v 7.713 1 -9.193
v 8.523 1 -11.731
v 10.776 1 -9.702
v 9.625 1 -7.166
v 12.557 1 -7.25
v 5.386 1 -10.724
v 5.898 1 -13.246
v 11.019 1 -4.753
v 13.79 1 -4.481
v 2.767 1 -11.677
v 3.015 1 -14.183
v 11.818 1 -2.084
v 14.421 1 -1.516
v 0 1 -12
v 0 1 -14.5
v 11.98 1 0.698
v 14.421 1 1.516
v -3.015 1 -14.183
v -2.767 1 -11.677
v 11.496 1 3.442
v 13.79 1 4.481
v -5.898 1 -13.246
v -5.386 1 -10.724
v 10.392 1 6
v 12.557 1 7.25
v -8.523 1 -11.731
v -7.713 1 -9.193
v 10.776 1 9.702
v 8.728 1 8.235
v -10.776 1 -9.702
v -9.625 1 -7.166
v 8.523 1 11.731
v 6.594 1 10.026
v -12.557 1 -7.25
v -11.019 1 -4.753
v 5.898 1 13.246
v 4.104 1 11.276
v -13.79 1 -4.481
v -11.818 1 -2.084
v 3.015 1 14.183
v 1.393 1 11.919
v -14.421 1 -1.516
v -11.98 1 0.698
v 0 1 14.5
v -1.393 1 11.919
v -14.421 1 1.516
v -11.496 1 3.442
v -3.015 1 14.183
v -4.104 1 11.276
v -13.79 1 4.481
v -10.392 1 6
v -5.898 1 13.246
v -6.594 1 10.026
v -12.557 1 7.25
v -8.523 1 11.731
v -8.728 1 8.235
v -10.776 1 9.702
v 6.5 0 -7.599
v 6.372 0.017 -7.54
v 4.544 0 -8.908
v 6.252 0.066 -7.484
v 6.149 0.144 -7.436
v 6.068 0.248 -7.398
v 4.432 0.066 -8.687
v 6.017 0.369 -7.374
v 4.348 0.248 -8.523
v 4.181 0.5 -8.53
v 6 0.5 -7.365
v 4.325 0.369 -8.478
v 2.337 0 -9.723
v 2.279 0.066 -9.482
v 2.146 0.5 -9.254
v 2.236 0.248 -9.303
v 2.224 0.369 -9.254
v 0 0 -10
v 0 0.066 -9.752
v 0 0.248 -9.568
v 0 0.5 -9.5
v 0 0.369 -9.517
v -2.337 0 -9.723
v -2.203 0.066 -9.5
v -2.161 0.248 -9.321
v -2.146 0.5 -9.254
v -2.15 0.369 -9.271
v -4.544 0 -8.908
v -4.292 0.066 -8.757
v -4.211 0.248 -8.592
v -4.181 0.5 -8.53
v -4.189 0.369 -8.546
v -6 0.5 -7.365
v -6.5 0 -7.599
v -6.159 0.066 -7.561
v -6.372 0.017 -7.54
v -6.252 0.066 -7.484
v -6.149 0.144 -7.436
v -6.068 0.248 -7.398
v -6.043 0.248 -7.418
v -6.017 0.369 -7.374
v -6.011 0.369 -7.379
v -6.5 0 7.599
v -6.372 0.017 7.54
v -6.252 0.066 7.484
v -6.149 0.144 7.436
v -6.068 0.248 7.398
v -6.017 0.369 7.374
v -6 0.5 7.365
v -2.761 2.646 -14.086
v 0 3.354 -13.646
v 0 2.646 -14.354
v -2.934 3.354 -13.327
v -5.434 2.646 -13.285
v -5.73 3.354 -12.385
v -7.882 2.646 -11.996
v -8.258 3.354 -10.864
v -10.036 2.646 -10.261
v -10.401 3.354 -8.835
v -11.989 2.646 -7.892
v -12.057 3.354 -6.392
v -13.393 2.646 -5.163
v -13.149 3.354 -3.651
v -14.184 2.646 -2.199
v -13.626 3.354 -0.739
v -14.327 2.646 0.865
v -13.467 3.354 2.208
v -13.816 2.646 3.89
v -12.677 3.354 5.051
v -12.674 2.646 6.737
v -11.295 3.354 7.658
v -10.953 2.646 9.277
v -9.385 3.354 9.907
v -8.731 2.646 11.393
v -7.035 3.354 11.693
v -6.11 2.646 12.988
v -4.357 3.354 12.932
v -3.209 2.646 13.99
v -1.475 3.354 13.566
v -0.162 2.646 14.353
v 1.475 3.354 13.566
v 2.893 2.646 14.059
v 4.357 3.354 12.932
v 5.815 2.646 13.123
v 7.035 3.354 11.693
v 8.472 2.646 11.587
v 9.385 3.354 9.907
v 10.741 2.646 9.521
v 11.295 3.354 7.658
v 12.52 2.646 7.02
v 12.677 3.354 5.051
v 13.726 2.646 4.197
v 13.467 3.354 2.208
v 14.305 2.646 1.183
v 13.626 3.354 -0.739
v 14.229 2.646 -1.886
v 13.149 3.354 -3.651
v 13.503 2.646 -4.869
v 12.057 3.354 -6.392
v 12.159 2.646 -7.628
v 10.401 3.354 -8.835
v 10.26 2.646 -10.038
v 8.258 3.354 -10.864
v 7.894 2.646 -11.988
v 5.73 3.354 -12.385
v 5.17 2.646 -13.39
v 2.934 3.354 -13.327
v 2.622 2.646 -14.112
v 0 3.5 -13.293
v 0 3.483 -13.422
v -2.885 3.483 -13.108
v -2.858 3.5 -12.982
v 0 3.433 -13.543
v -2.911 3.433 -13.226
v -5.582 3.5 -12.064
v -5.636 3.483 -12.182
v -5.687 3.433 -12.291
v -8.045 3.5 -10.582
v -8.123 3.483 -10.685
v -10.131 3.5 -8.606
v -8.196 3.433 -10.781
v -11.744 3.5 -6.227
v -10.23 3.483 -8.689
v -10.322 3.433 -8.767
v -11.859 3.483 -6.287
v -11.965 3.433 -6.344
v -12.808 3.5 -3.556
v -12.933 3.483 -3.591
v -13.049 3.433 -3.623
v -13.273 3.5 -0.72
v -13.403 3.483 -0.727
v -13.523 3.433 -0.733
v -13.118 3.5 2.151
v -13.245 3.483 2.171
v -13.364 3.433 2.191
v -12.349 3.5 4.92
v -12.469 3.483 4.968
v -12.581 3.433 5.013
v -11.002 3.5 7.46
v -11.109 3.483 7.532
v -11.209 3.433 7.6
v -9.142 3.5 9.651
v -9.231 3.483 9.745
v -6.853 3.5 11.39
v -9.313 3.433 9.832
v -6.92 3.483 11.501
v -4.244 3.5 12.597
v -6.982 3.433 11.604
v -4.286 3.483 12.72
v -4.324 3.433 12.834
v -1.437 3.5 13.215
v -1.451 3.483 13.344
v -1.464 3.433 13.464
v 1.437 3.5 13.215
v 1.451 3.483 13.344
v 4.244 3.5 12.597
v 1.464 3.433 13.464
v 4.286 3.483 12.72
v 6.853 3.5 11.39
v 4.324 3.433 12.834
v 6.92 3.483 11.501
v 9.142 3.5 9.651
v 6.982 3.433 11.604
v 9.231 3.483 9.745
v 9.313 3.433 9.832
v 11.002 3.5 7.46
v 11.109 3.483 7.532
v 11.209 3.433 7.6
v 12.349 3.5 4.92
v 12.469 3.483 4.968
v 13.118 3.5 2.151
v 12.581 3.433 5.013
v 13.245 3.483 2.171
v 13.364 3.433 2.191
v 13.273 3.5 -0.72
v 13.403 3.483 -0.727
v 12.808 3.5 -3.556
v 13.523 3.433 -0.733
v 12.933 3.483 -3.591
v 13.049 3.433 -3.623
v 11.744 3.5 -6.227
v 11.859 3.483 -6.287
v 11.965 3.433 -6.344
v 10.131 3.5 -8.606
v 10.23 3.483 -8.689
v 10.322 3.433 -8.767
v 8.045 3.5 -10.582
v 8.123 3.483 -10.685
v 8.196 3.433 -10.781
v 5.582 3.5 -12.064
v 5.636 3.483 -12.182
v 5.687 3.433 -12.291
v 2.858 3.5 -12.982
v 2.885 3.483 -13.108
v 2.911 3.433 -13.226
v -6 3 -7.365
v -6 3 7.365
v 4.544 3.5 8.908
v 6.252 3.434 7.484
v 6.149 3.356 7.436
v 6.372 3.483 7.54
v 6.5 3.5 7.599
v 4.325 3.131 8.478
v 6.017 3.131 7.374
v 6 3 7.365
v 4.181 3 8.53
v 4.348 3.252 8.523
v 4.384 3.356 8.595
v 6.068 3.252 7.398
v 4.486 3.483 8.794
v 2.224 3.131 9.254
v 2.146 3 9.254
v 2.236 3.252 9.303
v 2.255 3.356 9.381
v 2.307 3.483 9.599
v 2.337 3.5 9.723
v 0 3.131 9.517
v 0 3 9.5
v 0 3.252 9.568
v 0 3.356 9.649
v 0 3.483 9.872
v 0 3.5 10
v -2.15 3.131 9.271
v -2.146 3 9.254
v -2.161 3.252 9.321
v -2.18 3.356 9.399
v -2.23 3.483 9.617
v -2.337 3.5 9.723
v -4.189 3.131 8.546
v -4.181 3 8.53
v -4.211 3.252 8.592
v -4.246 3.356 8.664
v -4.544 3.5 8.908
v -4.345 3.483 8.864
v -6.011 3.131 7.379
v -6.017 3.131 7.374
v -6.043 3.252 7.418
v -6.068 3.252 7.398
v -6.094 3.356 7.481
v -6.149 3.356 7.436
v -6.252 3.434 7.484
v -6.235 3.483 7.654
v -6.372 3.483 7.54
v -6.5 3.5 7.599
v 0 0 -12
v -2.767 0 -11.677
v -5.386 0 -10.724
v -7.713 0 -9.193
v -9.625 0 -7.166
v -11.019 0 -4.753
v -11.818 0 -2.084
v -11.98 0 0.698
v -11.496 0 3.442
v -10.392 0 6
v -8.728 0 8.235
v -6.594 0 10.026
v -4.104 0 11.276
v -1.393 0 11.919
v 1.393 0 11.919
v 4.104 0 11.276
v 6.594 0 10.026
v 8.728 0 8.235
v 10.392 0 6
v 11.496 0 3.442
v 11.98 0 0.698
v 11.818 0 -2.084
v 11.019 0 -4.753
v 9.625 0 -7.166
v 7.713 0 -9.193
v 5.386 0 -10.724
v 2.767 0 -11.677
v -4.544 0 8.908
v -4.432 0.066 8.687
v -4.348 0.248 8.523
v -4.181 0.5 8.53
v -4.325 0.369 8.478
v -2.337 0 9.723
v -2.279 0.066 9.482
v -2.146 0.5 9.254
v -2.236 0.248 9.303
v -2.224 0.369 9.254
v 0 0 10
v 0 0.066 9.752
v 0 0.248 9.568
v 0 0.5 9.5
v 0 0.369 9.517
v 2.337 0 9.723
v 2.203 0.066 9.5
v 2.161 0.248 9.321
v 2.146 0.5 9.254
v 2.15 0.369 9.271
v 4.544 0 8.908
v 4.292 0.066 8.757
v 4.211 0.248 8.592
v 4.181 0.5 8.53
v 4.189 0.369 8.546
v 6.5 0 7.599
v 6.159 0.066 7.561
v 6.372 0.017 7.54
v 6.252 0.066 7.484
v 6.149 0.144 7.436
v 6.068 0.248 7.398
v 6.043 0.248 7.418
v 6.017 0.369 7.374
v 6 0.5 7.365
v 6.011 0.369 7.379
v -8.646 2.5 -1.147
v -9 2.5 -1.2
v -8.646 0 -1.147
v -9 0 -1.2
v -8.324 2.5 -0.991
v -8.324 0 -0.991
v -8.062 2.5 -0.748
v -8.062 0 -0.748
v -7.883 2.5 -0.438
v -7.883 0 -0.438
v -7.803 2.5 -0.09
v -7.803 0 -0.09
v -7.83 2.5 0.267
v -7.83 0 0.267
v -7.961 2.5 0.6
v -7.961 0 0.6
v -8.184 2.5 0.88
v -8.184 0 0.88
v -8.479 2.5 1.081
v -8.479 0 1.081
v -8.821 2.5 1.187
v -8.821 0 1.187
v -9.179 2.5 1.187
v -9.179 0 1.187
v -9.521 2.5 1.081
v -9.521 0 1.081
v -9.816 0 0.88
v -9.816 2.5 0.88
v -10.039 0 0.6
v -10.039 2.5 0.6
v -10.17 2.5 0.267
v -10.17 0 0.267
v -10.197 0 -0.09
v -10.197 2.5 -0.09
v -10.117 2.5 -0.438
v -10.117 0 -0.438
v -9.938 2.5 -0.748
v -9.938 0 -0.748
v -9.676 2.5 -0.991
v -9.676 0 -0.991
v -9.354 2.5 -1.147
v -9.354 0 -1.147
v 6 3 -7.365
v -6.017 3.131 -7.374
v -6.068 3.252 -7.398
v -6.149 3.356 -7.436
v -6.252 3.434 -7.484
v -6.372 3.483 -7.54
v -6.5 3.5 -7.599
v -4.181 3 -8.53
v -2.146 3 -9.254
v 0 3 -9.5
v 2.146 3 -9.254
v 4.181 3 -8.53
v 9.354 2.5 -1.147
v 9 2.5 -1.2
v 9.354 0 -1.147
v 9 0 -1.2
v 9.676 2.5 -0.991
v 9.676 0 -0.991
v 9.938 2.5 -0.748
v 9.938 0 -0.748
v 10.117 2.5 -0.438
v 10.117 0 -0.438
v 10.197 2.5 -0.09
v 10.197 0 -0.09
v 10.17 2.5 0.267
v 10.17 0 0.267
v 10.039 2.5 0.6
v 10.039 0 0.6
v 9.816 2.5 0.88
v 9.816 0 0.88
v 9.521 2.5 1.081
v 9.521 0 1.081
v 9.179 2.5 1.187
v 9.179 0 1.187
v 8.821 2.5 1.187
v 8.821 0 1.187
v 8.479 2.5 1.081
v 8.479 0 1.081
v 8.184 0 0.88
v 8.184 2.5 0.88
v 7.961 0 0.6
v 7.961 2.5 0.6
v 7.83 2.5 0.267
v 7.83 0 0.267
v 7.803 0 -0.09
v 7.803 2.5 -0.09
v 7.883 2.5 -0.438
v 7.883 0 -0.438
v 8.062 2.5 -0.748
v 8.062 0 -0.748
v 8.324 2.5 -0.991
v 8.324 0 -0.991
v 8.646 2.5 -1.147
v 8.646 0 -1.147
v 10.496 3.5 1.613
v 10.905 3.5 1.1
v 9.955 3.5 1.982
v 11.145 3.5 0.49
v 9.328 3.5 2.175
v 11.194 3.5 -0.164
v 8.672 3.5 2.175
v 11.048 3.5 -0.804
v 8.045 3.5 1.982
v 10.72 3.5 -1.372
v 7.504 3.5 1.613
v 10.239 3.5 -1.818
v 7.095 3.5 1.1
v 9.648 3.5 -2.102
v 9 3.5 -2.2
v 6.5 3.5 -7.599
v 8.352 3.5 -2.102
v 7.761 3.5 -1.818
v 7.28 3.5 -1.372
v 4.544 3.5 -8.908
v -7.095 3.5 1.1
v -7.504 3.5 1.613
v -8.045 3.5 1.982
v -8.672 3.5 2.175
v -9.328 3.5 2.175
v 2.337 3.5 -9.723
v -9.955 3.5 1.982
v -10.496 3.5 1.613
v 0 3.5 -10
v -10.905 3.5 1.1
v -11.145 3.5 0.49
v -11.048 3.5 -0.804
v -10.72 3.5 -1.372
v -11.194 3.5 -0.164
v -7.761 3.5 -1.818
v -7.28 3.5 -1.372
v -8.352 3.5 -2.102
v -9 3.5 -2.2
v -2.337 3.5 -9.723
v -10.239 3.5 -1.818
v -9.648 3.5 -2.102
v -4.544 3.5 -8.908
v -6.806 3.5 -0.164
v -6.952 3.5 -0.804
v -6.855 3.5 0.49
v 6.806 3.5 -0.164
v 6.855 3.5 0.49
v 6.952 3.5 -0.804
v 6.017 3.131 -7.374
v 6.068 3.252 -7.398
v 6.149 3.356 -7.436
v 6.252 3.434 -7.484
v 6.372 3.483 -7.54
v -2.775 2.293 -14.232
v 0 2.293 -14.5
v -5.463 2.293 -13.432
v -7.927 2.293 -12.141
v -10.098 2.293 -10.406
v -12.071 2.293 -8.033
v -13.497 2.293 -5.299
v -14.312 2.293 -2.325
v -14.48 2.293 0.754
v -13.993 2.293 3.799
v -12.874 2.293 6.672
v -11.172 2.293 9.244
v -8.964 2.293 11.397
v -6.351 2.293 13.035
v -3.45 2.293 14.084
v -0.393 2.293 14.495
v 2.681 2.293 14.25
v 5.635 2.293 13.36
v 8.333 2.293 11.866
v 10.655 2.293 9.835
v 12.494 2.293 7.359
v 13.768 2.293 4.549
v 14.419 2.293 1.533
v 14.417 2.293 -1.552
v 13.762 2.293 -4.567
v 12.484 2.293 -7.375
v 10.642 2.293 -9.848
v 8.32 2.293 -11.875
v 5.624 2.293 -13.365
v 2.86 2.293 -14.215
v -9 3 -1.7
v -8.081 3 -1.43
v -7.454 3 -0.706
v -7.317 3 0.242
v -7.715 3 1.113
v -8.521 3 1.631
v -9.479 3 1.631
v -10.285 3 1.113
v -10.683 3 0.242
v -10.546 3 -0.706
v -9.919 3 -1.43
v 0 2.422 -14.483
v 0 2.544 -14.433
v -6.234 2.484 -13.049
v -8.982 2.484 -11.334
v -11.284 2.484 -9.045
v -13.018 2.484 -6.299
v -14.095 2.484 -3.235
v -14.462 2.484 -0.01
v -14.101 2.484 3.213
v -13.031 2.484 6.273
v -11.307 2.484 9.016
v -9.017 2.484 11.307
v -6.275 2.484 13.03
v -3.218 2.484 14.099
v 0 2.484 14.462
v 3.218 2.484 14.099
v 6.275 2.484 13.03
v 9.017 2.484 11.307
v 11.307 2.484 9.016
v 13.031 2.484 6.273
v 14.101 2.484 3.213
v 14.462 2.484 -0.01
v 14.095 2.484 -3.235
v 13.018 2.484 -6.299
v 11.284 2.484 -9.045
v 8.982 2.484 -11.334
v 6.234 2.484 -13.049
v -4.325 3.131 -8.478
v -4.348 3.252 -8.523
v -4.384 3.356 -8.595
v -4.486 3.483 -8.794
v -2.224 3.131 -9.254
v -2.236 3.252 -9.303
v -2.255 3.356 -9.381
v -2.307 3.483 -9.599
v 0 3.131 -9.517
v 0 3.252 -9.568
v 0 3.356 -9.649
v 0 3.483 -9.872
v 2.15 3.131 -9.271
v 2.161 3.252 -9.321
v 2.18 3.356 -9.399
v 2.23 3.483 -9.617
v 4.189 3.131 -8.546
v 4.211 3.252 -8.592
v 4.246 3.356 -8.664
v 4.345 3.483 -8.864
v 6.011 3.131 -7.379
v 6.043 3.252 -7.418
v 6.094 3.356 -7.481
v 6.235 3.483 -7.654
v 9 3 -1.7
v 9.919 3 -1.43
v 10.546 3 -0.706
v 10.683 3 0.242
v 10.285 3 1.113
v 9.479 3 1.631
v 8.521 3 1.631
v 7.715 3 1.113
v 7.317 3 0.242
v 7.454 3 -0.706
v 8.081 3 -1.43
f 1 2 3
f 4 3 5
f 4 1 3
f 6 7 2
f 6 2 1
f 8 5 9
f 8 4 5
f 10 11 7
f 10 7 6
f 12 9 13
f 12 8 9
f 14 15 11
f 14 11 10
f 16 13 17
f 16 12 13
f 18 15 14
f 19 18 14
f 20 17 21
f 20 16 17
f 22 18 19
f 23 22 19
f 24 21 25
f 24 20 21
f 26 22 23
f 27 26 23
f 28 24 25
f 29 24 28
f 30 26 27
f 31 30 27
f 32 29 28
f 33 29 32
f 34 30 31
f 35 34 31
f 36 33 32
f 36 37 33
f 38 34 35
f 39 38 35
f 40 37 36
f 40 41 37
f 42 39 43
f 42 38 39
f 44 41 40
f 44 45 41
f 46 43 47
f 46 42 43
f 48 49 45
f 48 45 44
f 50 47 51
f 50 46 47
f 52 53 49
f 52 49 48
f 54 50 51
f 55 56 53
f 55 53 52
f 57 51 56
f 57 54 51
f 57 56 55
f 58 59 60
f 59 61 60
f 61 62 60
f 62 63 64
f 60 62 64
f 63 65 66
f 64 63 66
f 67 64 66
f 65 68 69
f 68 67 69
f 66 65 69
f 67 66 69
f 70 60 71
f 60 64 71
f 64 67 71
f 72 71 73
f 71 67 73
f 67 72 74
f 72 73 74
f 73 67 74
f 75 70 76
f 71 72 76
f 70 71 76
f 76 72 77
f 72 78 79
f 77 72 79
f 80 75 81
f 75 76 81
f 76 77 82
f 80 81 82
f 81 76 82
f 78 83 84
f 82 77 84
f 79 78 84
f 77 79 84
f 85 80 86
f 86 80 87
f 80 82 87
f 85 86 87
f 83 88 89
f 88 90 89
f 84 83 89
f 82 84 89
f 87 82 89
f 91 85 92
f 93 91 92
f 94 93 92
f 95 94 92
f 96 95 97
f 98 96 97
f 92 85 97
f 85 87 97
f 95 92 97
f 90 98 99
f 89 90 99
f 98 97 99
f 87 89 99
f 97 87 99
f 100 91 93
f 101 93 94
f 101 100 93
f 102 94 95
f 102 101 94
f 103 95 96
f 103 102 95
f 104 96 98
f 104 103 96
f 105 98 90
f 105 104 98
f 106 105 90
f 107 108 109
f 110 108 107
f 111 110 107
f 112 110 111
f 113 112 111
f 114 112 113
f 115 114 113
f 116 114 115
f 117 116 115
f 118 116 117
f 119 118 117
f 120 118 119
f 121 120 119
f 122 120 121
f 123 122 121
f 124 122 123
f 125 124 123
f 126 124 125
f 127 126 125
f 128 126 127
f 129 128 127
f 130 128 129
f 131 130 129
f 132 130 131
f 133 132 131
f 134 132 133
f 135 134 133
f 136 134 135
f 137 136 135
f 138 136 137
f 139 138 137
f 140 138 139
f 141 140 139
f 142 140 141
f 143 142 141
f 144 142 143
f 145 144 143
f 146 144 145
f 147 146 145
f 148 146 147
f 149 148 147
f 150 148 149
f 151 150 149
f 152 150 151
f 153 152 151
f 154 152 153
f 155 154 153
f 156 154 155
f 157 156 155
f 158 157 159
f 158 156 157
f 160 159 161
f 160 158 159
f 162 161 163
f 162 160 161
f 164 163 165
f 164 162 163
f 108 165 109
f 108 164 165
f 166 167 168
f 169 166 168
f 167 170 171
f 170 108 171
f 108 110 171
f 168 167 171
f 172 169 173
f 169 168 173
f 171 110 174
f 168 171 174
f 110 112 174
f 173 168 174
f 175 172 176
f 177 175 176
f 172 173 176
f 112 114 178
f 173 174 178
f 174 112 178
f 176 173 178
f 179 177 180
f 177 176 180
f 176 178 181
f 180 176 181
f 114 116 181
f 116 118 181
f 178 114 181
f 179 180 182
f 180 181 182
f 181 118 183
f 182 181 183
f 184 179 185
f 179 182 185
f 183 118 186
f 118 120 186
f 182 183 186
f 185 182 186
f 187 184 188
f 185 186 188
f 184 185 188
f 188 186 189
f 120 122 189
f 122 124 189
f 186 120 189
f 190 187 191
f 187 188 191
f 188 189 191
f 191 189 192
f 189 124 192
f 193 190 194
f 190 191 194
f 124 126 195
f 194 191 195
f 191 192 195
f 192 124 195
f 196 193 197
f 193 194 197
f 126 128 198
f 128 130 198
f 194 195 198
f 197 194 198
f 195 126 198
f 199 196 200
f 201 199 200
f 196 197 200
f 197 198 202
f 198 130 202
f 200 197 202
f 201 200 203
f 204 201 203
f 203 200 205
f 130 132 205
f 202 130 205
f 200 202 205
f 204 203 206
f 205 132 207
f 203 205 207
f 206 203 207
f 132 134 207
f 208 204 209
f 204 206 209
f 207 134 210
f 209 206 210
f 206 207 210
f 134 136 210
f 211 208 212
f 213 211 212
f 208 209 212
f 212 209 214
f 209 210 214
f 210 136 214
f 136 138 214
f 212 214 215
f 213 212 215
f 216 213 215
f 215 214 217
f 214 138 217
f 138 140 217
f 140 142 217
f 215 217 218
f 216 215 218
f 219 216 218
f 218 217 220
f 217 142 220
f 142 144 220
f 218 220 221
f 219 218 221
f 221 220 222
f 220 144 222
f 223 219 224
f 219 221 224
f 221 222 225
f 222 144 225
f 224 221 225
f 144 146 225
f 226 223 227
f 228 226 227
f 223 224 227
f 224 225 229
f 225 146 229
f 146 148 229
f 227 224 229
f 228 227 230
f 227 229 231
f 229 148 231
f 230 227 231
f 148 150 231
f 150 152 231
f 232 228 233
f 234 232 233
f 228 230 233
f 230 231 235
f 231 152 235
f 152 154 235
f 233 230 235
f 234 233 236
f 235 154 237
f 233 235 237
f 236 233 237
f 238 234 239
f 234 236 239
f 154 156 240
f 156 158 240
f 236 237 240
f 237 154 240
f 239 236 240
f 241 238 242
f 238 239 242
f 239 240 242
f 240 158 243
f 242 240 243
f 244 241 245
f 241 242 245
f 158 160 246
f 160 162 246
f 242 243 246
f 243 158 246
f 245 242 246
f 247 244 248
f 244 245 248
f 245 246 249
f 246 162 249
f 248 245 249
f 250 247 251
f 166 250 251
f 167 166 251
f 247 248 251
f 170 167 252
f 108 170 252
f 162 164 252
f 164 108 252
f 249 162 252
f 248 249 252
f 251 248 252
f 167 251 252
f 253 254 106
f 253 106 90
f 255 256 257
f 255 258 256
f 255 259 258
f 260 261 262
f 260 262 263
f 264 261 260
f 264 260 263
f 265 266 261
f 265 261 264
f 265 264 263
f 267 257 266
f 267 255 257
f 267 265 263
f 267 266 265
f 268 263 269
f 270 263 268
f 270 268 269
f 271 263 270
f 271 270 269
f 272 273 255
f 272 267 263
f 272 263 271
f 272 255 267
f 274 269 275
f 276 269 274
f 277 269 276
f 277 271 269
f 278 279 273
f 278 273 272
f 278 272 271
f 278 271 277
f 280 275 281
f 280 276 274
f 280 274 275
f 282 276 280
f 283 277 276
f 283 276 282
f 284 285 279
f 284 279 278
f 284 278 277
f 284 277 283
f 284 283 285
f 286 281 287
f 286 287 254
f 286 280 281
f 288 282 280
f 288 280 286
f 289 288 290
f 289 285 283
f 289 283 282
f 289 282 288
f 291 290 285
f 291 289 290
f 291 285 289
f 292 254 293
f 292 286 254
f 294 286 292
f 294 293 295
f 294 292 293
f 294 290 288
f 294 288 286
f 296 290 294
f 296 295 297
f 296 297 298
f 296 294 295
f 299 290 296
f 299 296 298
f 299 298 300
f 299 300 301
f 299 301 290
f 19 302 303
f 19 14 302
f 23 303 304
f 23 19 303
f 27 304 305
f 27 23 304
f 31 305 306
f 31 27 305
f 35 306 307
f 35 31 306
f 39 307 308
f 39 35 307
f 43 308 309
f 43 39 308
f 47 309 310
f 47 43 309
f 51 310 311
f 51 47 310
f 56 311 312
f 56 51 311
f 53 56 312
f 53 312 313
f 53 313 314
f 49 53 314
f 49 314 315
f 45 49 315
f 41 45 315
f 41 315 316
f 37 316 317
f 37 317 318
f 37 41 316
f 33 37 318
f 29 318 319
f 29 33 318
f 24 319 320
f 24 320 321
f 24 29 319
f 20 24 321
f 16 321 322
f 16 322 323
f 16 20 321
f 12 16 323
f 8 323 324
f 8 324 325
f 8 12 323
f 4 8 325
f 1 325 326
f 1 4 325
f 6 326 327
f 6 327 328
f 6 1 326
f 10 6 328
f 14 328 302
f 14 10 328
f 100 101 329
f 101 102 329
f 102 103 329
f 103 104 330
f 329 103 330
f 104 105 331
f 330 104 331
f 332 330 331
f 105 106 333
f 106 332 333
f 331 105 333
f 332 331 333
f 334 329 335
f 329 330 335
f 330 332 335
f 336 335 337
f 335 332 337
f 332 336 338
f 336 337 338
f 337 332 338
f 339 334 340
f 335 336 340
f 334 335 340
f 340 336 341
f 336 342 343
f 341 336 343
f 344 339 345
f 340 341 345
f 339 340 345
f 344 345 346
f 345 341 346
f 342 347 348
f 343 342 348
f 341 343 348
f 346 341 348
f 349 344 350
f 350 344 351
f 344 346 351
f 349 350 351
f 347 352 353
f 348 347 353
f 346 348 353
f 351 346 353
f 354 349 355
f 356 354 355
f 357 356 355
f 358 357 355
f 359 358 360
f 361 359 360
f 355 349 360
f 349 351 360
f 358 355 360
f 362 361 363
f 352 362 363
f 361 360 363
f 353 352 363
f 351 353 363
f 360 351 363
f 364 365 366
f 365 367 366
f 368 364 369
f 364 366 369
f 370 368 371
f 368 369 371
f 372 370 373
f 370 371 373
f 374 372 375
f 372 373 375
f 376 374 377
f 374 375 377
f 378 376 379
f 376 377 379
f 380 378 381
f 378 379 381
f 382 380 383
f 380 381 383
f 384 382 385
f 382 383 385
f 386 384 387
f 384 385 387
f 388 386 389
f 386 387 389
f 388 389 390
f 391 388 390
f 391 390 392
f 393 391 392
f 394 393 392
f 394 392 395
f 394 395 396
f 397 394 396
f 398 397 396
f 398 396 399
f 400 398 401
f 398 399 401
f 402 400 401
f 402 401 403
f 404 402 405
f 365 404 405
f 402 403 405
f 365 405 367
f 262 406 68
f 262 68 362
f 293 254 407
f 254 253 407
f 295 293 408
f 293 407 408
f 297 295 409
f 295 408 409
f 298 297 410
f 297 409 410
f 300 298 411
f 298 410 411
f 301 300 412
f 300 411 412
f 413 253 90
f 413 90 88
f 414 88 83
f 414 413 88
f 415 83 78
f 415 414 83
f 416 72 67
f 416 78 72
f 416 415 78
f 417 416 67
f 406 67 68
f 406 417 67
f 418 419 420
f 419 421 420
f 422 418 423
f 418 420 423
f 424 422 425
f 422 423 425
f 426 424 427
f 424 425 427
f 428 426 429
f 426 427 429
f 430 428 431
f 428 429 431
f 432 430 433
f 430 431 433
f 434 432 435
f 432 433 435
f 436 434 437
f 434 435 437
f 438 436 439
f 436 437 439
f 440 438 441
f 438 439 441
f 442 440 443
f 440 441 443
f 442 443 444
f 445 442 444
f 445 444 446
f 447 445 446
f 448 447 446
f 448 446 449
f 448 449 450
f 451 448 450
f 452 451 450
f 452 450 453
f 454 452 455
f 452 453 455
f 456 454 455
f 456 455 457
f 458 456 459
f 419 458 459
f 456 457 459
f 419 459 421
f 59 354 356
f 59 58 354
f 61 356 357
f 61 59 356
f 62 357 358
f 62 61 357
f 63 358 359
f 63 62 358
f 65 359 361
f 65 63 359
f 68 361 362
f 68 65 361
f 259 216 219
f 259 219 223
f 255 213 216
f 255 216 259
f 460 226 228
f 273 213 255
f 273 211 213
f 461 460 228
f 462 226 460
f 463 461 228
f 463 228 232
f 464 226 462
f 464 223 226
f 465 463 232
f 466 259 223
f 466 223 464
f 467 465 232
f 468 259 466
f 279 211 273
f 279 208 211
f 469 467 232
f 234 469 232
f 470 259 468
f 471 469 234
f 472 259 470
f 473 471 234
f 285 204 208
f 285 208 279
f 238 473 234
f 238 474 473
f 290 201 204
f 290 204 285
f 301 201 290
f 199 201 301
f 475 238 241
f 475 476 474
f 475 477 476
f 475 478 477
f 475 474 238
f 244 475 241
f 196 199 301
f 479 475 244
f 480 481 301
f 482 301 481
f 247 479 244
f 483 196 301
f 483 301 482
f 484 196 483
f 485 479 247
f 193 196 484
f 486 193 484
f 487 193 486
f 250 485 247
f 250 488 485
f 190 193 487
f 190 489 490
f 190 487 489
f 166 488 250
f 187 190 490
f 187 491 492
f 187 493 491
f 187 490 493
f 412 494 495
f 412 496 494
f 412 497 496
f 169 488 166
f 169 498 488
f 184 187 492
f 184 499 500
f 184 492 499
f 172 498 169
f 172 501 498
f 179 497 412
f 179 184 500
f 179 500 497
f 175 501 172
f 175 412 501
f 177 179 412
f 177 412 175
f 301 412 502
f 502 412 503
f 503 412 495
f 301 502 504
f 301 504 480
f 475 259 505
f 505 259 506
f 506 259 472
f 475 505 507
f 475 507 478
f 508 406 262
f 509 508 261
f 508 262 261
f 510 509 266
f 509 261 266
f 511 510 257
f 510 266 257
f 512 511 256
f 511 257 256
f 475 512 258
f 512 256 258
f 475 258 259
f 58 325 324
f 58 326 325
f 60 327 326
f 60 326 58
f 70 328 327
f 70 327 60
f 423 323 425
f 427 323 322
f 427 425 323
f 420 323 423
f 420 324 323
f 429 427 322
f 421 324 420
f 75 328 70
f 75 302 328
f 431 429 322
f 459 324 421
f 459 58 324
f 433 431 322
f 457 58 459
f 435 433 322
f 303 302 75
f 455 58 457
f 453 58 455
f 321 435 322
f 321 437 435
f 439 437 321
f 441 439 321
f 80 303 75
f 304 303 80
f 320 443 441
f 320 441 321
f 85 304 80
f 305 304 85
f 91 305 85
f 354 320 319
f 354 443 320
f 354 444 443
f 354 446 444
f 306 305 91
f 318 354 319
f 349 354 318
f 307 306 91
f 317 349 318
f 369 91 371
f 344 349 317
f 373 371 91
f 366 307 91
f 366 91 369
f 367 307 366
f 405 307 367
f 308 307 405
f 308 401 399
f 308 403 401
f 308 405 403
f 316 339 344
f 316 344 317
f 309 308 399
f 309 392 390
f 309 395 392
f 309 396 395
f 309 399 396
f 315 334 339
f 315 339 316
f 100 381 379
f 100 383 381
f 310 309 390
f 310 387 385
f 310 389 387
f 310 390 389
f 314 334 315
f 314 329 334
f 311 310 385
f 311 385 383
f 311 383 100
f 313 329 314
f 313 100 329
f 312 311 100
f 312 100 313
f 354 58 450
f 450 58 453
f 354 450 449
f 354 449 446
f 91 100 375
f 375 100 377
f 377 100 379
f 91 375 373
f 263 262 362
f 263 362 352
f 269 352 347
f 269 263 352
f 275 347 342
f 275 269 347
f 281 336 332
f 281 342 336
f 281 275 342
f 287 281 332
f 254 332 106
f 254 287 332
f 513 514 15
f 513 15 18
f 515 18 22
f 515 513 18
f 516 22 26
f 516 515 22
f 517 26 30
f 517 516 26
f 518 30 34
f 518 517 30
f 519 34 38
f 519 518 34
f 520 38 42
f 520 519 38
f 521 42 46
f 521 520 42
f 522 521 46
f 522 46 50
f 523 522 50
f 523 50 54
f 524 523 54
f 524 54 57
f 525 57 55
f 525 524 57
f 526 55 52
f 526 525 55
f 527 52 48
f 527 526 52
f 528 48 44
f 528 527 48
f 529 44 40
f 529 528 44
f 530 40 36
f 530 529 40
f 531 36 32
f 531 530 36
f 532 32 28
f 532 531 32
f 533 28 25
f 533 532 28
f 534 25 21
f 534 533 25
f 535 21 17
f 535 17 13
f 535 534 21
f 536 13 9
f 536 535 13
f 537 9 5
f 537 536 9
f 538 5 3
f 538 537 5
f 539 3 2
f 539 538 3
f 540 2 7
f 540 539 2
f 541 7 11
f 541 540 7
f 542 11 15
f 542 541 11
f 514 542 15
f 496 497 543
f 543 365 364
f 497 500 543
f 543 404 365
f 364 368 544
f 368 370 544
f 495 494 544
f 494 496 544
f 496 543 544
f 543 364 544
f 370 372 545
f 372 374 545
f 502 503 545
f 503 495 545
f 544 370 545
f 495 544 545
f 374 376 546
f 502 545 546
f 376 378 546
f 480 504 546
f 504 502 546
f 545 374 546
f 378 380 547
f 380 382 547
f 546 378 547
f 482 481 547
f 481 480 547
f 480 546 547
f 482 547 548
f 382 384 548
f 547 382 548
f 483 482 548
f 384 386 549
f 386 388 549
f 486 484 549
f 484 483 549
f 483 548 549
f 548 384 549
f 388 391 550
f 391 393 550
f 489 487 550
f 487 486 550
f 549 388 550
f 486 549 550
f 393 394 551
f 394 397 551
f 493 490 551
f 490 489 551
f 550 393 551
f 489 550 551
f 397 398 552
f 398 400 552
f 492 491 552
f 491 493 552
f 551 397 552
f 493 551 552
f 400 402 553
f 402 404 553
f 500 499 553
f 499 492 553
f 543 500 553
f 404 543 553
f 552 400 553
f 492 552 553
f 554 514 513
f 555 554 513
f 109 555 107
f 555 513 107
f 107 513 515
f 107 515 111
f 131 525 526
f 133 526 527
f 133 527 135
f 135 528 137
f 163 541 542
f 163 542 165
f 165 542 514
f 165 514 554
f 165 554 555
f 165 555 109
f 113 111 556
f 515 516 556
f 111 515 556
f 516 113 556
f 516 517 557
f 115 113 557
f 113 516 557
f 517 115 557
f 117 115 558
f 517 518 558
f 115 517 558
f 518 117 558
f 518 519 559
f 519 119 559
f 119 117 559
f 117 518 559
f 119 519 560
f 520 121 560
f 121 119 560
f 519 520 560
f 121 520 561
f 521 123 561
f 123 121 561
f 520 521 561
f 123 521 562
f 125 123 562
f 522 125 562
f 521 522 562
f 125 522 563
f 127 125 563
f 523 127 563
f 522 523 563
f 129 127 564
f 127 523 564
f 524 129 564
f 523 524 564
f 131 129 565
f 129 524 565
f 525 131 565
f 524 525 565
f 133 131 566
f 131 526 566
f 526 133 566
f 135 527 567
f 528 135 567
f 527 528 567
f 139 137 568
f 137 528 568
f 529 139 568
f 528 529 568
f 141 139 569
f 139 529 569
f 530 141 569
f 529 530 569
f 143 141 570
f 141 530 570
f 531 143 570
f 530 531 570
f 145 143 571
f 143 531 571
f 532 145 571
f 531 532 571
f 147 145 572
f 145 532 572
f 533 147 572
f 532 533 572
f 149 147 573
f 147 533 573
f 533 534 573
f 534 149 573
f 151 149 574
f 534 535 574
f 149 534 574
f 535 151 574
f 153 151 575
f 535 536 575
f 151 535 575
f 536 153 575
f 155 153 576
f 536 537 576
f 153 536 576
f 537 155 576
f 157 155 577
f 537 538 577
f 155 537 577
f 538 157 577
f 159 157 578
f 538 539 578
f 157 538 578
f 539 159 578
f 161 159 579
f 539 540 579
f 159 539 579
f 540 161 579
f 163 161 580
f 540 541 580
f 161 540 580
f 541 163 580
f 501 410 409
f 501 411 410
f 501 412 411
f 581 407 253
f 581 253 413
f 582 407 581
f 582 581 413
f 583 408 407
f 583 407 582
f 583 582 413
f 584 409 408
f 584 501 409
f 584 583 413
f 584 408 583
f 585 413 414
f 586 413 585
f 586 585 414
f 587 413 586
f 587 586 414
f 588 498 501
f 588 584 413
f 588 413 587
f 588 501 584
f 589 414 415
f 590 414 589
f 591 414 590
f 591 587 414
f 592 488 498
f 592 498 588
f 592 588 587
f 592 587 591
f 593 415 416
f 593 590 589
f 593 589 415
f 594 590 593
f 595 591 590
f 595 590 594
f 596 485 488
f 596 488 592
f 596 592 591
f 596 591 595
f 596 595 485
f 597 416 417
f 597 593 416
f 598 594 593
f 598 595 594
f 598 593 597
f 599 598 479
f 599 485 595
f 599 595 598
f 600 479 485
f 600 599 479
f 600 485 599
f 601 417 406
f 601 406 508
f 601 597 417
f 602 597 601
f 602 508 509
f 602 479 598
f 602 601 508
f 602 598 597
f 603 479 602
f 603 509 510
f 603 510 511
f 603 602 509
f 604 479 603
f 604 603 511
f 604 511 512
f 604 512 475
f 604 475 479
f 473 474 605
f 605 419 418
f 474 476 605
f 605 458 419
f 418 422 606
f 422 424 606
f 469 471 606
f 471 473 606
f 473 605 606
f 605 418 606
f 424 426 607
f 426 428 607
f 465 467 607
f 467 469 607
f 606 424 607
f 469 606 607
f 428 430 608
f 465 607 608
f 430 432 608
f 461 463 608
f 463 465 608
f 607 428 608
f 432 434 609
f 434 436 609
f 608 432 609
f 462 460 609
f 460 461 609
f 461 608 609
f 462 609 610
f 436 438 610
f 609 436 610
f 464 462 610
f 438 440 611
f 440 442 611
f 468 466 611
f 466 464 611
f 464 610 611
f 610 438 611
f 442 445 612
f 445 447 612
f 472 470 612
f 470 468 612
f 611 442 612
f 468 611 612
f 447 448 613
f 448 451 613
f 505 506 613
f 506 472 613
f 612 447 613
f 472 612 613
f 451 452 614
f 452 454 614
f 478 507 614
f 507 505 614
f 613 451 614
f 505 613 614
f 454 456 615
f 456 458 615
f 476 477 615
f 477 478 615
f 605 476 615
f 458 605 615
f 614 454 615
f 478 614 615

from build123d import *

# Parameters (mm, degrees)
ENL_V_MAT_EXTRU_1_DEPTH                        = 21.802644063
CONG_1_R                                       = 0.5
FRAISAGE_POUR_VIS_T_TE_FRAIS_E_M21_D           = 2.4
FRAISAGE_POUR_VIS_T_TE_FRAIS_E_M21_CSINK_D     = 4.4
FRAISAGE_POUR_VIS_T_TE_FRAIS_E_M21_CSINK_ANGLE = 90


with BuildPart() as part:
    # Esquisse1 → Révolution1 (revolve)
    with BuildSketch(Plane.XY, mode=Mode.PRIVATE) as r_volution1_sk:
        Polygon((12, 0), (12, 1), (14.5, 1), (14.5, 2.5), (13.5, 3.5), (0, 3.5), (0, 0), align=None)
    revolve(r_volution1_sk.sketch.rotate(Axis((0, -5.347368421, 0), (0, 1, 0)), 90), axis=Axis((0, -5.347368421, 0), (0, 1, 0)))

    # Esquisse2 → Enlèv. mat.-Extru.1 (cut, through all)
    with BuildSketch(Plane(origin=(0, 3.5, 0), x_dir=(1, 0, 0), z_dir=(0, 1, 0))):
        with BuildLine():
            Line((-6, -7.365459931), (-6, 7.365459931))
            ThreePointArc((-6, 7.365459931), (0, 9.5), (6, 7.365459931))
            Line((6, 7.365459931), (6, -7.365459931))
            ThreePointArc((6, -7.365459931), (0, -9.5), (-6, -7.365459931))
        make_face()
    extrude(amount=-ENL_V_MAT_EXTRU_1_DEPTH, mode=Mode.SUBTRACT)

    # Congé1
    cong_1_edges = [part.edges().sort_by_distance(p)[0] for p in [
        (0, 0, 9.5),
        (-6, 0, 0),
        (0, 0, -9.5),
        (6, 0, 0),
        (0, 3.5, 9.5),
        (6, 3.5, 0),
        (0, 3.5, -9.5),
        (-6, 3.5, 0),
        (0, 2.5, 14.5),
        (0, 3.5, 13.5),
    ]]
    fillet(cong_1_edges, radius=CONG_1_R)

    # Fraisage pour vis à tête fraisée M21 (through all)
    with Locations(Plane(origin=(-9, 3.5, 0), x_dir=(0, 0, 1), z_dir=(0, 1, 0))):
        with Locations((0, 0), (0, 18)):
            CounterSinkHole(FRAISAGE_POUR_VIS_T_TE_FRAIS_E_M21_D / 2, FRAISAGE_POUR_VIS_T_TE_FRAIS_E_M21_CSINK_D / 2, counter_sink_angle=FRAISAGE_POUR_VIS_T_TE_FRAIS_E_M21_CSINK_ANGLE)


solid = part.part
